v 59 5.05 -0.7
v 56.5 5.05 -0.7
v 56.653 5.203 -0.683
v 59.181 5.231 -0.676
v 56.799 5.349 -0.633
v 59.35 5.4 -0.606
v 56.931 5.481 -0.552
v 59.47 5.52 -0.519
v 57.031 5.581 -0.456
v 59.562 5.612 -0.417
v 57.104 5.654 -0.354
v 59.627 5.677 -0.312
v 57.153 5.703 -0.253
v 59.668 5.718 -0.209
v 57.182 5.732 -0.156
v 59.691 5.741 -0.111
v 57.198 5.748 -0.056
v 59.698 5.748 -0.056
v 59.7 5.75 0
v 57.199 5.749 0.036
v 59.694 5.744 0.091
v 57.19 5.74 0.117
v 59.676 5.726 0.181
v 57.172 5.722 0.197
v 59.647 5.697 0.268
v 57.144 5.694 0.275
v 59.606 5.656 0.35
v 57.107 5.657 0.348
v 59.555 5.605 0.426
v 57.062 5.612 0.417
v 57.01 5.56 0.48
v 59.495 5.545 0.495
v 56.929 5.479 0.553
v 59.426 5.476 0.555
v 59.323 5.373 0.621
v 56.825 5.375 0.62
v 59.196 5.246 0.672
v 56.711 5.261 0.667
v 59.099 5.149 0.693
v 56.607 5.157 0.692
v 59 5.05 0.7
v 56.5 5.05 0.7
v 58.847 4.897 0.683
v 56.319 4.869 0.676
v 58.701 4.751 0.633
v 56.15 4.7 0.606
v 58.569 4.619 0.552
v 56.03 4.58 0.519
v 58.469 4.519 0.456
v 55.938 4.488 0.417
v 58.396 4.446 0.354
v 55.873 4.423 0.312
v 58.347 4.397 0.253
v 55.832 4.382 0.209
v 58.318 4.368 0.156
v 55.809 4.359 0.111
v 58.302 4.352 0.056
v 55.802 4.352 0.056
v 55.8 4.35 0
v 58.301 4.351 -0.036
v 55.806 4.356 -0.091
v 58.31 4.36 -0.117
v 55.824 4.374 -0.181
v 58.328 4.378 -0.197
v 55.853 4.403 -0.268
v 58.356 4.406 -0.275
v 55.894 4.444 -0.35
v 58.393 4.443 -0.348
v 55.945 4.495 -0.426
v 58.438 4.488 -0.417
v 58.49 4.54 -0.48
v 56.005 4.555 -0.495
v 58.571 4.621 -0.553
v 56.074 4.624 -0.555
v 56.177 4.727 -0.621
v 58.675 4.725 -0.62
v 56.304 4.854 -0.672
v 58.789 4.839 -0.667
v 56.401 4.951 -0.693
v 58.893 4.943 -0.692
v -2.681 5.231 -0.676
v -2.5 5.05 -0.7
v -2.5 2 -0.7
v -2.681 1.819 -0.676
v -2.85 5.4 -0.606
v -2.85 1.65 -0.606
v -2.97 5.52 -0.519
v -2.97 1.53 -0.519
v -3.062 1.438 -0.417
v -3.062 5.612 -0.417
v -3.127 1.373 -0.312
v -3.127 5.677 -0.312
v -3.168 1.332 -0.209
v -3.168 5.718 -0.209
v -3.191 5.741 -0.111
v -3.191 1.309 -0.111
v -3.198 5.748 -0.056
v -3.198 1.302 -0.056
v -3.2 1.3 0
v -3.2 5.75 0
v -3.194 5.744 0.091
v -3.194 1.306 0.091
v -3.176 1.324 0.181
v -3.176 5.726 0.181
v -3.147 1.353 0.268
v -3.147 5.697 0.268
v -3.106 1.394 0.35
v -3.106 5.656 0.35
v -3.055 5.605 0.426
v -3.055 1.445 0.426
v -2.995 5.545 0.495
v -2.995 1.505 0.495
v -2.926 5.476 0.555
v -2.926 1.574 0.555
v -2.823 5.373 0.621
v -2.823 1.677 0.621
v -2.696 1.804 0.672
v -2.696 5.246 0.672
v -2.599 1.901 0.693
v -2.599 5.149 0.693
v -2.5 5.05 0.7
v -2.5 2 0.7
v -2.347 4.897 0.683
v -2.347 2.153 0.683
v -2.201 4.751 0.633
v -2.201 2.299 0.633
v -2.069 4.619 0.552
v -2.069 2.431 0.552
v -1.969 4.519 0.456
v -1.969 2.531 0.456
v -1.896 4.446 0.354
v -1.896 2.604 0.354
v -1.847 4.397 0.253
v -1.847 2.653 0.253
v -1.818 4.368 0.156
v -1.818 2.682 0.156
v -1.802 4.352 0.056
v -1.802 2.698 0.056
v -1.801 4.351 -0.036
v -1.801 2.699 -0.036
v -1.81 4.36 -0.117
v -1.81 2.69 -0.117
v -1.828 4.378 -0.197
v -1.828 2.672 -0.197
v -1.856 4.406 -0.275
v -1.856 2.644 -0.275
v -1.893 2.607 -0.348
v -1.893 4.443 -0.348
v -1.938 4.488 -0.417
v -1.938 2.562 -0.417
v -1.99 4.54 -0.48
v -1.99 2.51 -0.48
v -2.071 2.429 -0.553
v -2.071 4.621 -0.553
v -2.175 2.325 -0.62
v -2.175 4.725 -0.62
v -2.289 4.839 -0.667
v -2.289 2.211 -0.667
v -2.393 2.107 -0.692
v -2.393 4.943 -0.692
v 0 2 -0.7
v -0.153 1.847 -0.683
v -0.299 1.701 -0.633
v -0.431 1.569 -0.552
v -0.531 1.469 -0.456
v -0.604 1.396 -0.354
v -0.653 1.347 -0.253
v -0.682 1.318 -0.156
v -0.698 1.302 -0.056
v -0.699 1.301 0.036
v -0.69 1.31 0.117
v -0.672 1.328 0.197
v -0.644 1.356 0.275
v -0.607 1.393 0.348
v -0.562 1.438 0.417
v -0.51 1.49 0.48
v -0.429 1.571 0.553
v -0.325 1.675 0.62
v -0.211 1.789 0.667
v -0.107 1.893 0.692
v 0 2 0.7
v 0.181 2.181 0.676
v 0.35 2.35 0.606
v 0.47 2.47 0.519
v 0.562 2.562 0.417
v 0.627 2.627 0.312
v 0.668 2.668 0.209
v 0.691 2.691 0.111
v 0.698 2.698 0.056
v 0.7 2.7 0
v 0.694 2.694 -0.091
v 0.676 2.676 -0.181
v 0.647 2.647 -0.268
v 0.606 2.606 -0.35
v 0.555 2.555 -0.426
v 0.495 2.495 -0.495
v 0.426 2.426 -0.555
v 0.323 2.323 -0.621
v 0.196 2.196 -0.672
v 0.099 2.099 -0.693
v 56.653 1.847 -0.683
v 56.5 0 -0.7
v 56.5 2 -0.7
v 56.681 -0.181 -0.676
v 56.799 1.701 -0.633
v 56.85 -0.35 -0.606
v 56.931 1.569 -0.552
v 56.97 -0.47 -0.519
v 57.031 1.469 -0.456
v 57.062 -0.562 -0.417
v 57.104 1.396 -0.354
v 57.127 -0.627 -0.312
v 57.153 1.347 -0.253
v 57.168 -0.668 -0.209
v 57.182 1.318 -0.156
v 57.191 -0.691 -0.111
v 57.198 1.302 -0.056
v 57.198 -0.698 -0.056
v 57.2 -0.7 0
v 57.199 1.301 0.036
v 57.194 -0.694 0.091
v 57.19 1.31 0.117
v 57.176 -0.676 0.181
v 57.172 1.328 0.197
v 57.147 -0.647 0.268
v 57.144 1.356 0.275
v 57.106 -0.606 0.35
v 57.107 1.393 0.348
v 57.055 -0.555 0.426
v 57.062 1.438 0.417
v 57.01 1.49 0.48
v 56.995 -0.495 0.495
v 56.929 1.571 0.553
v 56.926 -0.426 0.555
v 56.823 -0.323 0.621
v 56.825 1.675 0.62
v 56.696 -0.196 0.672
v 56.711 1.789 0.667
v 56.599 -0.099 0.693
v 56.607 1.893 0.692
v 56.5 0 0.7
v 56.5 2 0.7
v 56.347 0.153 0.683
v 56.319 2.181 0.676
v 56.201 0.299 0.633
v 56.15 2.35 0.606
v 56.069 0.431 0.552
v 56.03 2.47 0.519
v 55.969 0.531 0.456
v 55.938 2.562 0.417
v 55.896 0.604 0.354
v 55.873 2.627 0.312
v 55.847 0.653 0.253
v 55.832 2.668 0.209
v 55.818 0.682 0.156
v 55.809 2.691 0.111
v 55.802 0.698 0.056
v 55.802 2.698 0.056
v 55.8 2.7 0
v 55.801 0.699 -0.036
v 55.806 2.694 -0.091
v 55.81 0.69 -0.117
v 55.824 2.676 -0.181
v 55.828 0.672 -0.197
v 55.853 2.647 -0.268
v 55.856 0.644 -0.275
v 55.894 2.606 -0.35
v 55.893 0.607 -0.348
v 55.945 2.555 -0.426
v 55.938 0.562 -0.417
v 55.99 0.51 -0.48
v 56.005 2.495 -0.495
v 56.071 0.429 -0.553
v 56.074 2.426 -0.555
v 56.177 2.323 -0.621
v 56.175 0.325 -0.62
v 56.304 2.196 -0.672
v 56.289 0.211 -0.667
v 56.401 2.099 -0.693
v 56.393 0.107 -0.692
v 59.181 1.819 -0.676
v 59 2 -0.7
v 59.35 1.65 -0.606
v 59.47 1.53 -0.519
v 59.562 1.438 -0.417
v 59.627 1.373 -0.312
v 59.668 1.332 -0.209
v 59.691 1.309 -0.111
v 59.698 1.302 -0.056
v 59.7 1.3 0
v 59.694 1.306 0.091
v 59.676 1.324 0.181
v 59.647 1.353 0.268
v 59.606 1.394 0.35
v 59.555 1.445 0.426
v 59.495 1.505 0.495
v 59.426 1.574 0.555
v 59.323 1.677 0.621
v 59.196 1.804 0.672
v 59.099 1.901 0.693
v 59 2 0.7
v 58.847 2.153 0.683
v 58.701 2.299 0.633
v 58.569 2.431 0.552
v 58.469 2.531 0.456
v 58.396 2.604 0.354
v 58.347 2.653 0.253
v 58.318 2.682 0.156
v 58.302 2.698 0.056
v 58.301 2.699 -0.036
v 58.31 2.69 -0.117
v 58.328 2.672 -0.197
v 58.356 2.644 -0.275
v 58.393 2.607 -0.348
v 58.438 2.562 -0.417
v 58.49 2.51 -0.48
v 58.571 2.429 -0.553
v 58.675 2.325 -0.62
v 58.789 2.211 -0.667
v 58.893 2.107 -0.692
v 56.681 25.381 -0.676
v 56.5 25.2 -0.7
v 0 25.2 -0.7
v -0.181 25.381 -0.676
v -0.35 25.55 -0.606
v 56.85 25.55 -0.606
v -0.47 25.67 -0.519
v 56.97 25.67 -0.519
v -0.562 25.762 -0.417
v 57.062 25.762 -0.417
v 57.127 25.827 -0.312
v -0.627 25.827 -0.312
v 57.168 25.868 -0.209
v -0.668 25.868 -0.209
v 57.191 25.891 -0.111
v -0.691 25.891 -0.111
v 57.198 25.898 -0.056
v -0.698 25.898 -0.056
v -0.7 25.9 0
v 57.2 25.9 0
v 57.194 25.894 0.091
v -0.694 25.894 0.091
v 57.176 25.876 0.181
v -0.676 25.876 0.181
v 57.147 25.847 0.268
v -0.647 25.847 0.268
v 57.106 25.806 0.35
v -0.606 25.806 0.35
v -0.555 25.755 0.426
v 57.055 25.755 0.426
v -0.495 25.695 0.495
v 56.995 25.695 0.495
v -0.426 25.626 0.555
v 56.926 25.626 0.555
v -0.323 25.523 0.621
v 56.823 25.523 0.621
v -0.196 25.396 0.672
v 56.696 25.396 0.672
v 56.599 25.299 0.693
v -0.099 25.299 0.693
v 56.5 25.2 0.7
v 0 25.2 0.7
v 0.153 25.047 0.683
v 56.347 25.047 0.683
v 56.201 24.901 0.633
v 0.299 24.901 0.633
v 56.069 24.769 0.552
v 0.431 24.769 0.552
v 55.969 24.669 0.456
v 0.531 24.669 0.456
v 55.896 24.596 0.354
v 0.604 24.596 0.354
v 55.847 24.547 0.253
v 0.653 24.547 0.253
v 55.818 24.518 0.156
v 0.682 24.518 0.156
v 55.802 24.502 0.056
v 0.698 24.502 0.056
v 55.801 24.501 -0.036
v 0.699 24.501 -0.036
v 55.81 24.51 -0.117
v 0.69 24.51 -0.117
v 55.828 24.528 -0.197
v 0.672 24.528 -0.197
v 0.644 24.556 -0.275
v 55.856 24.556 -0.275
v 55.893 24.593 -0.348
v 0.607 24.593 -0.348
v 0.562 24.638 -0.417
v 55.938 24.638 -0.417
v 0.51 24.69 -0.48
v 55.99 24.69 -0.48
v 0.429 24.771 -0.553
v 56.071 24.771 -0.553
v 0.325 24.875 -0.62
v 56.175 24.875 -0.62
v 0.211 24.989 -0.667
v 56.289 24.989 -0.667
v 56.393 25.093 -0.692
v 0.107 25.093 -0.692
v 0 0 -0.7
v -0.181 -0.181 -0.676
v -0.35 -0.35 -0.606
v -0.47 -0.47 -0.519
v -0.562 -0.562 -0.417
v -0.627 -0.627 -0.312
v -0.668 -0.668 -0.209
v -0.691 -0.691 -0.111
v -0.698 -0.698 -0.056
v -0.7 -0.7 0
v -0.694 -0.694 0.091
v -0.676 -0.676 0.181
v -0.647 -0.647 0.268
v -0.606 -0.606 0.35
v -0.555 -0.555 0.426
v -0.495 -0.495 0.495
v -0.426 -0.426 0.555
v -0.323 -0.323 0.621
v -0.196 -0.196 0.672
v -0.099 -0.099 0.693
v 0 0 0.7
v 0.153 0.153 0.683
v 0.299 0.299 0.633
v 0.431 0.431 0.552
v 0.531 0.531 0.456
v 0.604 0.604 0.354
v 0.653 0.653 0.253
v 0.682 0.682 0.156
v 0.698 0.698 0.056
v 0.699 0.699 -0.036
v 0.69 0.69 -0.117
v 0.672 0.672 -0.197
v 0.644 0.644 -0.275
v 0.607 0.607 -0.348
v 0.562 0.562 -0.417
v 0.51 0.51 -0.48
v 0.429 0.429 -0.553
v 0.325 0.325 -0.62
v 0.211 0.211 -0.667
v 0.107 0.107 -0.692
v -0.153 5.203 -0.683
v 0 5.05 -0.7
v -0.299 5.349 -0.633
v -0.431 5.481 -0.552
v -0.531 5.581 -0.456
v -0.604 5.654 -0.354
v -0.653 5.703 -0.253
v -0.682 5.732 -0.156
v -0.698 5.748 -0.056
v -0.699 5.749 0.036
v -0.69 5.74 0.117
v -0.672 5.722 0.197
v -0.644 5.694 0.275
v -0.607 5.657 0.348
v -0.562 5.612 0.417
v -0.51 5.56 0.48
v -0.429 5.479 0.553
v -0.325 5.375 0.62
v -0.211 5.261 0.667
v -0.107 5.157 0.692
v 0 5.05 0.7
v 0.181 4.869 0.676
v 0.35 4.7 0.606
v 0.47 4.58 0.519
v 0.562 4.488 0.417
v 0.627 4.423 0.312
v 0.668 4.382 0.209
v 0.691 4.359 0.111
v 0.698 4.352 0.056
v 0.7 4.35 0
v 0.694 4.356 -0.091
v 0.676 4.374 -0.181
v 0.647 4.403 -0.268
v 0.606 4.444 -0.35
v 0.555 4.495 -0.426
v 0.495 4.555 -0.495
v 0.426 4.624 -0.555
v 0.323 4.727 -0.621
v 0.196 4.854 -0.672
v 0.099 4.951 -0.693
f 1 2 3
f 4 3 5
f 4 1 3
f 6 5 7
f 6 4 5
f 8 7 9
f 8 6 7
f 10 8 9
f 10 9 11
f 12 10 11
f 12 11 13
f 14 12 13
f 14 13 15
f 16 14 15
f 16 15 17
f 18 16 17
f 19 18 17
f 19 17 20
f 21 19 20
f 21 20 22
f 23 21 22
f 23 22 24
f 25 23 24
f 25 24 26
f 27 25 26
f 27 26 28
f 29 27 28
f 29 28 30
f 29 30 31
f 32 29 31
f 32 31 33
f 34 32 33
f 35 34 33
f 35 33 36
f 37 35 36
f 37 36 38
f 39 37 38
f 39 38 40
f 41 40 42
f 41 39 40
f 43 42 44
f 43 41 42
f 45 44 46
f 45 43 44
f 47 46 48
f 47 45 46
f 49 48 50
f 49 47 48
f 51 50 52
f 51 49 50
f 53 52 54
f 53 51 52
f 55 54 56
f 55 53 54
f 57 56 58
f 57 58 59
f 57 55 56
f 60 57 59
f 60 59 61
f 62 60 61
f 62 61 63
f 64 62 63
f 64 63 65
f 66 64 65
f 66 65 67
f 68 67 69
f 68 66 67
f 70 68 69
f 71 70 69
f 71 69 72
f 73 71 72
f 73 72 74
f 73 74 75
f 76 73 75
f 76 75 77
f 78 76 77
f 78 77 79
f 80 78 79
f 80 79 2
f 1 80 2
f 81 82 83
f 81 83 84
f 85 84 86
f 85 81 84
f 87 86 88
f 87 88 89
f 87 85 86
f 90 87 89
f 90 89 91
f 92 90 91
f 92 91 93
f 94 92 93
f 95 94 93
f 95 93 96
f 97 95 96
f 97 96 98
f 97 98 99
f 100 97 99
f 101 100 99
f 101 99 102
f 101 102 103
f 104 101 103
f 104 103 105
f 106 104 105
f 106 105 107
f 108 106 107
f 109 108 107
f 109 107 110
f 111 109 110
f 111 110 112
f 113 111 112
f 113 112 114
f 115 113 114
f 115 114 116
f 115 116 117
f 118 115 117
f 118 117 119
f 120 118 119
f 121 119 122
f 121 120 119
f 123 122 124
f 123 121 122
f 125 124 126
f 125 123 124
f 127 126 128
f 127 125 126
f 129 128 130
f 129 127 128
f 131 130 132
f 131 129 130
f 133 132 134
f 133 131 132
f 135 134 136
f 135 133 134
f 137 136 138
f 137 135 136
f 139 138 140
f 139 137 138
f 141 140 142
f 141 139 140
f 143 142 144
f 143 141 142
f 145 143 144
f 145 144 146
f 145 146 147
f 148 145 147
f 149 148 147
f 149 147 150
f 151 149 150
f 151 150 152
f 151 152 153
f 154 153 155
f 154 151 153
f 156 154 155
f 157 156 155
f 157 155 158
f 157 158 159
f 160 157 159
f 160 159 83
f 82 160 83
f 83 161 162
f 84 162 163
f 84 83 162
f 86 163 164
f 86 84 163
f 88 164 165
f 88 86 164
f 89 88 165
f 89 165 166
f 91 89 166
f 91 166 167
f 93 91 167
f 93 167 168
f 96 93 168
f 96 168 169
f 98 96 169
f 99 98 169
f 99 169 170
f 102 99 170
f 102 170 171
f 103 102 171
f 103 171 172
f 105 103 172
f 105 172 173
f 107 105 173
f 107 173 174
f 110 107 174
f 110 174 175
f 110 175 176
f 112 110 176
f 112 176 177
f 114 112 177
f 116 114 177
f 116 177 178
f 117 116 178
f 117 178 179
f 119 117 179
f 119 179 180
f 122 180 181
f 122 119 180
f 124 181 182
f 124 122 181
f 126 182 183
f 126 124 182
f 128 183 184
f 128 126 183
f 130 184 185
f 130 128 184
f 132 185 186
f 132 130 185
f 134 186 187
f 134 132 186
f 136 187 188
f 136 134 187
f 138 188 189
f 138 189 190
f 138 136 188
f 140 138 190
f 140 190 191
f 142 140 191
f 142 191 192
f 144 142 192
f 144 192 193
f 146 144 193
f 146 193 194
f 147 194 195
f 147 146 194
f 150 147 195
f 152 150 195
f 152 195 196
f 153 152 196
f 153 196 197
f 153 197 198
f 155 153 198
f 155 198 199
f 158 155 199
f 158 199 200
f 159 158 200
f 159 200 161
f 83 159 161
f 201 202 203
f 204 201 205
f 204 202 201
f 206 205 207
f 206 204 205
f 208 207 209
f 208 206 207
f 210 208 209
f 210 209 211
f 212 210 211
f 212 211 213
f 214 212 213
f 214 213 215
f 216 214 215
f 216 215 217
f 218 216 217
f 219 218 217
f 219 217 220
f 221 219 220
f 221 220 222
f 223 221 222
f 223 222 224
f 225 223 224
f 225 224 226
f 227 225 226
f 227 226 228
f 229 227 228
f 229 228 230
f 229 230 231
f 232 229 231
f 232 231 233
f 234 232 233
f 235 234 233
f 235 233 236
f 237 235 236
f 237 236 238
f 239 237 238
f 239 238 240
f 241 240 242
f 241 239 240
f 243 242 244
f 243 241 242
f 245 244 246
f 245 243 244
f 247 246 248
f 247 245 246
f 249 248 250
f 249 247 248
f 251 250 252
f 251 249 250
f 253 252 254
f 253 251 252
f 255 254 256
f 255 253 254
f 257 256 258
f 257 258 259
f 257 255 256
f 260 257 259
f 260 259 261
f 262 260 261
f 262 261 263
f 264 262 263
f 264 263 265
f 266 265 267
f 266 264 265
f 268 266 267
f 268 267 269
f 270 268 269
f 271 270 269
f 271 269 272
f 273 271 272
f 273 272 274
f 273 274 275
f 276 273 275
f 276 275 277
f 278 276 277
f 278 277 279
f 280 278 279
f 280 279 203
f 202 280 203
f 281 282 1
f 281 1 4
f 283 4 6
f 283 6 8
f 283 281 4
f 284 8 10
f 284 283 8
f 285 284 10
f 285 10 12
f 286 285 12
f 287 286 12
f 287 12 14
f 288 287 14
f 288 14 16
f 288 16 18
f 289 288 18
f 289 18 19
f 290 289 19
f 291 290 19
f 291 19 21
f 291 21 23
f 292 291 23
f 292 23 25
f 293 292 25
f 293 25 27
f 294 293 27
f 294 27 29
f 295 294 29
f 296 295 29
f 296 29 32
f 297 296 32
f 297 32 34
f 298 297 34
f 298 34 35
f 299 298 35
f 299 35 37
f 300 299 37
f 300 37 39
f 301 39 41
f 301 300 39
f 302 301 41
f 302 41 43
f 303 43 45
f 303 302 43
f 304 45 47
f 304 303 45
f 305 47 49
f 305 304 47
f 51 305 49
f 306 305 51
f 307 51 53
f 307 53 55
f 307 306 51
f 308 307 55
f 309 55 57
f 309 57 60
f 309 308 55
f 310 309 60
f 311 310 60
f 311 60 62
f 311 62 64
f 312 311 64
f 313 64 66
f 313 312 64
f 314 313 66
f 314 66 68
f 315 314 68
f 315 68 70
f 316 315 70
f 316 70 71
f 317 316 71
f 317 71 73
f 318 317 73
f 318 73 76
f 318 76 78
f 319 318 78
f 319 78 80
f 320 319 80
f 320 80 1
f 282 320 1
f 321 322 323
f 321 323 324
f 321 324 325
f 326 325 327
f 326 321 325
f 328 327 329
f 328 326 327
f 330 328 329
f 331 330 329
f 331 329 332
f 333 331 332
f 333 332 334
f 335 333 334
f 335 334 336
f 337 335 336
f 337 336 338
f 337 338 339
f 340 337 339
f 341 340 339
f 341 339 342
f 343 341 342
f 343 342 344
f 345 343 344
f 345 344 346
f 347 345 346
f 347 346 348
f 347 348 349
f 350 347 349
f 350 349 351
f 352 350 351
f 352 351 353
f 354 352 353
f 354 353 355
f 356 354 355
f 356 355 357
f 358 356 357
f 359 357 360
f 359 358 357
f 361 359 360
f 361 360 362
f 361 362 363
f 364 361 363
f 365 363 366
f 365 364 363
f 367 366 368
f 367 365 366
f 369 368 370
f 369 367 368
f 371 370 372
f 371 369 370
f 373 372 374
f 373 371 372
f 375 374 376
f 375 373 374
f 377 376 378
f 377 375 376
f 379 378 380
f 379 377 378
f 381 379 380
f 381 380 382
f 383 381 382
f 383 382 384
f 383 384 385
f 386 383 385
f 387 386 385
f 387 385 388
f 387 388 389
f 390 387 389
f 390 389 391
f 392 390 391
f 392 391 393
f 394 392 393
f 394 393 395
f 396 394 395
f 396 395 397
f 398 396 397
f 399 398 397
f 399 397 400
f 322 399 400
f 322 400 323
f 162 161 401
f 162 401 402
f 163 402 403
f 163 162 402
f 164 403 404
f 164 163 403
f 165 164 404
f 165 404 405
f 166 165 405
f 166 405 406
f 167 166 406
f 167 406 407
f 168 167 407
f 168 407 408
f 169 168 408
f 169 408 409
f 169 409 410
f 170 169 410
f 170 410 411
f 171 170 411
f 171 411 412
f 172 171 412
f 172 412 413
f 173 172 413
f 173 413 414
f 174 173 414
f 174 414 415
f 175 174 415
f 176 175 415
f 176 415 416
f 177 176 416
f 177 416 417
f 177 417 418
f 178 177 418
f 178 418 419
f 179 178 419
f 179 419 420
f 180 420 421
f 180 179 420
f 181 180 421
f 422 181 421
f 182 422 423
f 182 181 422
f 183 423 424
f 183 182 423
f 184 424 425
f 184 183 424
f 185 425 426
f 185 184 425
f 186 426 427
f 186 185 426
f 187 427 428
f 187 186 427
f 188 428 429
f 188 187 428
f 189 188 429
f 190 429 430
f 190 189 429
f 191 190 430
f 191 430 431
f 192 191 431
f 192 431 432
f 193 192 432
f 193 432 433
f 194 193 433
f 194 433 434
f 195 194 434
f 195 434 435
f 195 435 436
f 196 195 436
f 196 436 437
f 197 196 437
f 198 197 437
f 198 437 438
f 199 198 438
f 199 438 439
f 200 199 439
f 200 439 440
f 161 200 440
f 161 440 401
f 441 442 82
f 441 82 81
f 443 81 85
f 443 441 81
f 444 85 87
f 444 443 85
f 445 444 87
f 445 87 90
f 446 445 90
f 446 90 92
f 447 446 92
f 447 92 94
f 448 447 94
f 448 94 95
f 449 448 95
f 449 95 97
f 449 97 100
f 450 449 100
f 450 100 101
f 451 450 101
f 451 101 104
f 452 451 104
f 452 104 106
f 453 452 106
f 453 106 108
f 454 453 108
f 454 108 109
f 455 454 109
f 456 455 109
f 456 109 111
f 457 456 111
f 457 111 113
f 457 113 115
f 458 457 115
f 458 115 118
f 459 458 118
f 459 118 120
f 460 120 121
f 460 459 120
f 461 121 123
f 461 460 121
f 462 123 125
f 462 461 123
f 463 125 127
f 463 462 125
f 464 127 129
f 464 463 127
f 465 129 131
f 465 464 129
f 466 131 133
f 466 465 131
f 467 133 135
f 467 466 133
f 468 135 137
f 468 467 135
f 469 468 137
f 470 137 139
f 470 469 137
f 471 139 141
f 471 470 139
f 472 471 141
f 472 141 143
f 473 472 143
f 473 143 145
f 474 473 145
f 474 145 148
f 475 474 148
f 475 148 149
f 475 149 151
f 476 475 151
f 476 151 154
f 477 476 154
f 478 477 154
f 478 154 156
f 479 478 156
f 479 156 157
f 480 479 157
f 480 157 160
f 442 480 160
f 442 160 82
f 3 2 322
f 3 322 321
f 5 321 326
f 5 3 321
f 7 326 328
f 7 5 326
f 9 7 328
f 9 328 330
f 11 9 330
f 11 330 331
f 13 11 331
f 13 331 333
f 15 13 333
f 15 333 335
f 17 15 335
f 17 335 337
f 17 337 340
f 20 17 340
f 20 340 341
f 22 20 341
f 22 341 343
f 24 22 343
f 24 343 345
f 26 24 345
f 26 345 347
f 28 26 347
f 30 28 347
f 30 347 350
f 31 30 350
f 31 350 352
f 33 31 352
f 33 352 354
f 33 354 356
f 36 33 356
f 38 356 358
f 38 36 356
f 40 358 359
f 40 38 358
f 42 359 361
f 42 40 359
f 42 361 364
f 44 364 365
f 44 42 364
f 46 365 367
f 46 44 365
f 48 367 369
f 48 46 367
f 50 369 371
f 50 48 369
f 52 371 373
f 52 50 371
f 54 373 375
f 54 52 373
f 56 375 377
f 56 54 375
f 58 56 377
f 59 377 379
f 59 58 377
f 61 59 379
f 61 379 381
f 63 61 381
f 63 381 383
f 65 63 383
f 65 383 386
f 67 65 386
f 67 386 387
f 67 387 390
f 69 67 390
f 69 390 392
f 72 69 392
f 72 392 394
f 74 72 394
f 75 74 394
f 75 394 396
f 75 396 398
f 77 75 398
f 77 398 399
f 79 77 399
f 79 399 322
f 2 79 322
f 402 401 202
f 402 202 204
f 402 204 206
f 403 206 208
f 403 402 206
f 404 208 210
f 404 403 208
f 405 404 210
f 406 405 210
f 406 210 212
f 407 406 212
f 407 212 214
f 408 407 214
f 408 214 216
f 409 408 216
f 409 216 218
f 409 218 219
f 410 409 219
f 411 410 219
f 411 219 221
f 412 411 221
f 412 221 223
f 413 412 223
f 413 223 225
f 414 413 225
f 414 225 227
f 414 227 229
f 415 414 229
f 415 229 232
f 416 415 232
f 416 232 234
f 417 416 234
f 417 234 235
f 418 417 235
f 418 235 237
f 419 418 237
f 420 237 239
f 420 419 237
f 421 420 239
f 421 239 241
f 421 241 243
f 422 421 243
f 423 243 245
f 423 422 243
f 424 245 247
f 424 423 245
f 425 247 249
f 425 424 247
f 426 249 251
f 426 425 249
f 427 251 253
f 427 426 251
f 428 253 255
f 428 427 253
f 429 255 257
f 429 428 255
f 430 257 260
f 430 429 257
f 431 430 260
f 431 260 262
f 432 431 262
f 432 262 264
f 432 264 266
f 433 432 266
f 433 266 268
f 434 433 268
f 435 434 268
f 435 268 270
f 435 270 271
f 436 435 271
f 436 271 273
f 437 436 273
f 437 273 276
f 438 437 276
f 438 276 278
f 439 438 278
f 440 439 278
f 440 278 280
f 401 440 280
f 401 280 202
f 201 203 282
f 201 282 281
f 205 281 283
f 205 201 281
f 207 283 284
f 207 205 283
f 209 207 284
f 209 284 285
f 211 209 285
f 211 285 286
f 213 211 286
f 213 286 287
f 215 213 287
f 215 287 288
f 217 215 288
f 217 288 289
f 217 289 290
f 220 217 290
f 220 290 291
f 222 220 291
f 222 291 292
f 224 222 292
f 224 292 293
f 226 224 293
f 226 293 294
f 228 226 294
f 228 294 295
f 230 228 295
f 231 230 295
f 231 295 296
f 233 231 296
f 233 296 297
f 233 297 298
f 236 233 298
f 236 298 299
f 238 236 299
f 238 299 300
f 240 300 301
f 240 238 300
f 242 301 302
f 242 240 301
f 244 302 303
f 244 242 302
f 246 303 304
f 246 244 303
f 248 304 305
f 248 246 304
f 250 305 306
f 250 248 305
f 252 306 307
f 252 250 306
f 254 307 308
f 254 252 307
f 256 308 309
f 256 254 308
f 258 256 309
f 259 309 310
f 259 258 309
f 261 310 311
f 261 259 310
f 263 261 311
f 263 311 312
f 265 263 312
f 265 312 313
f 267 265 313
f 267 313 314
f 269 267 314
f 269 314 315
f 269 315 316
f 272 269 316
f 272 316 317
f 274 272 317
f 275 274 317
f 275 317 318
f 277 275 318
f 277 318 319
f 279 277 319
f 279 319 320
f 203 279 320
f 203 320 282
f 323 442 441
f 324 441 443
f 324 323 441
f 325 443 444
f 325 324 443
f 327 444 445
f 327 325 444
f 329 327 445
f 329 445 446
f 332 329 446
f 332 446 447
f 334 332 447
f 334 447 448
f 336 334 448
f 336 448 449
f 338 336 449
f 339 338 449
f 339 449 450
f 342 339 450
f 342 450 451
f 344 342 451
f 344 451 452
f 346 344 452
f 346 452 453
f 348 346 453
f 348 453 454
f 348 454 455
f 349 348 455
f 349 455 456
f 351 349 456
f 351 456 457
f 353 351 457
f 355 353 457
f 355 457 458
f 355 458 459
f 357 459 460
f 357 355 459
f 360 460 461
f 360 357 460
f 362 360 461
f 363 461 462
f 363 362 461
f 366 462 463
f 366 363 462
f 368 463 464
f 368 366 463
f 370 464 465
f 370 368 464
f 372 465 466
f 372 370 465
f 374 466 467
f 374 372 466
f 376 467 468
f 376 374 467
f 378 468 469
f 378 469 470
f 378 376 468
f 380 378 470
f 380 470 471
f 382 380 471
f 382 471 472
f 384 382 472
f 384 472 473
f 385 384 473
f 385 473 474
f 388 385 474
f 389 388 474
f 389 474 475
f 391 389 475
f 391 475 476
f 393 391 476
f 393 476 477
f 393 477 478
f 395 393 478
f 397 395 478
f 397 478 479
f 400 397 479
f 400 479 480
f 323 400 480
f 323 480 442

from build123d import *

# Parameters (mm, degrees)
SKETCH2_R = 0.7


with BuildPart() as part:
    # Sweep1: sweep along a path in Sketch1
    with BuildLine(Plane.XY) as sweep1_path:
        Line((0, 25.2), (56.5, 25.2))
        Line((56.5, 25.2), (56.5, 5.05))
        Line((56.5, 5.05), (59, 5.05))
        Line((59, 5.05), (59, 2))
        Line((59, 2), (56.5, 2))
        Line((56.5, 2), (56.5, 0))
        Line((56.5, 0), (0, 0))
        Line((0, 0), (0, 2))
        Line((0, 2), (-2.5, 2))
        Line((-2.5, 2), (-2.5, 5.05))
        Line((-2.5, 5.05), (0, 5.05))
        Line((0, 5.05), (0, 25.2))
    # Sketch2 → Sweep1 (sweep)
    with BuildSketch(Plane(origin=(0, 0, 0), x_dir=(0, 0, -1), z_dir=(1, 0, 0))):
        Circle(SKETCH2_R)
    sweep(path=sweep1_path.line, transition=Transition.RIGHT)


solid = part.part
